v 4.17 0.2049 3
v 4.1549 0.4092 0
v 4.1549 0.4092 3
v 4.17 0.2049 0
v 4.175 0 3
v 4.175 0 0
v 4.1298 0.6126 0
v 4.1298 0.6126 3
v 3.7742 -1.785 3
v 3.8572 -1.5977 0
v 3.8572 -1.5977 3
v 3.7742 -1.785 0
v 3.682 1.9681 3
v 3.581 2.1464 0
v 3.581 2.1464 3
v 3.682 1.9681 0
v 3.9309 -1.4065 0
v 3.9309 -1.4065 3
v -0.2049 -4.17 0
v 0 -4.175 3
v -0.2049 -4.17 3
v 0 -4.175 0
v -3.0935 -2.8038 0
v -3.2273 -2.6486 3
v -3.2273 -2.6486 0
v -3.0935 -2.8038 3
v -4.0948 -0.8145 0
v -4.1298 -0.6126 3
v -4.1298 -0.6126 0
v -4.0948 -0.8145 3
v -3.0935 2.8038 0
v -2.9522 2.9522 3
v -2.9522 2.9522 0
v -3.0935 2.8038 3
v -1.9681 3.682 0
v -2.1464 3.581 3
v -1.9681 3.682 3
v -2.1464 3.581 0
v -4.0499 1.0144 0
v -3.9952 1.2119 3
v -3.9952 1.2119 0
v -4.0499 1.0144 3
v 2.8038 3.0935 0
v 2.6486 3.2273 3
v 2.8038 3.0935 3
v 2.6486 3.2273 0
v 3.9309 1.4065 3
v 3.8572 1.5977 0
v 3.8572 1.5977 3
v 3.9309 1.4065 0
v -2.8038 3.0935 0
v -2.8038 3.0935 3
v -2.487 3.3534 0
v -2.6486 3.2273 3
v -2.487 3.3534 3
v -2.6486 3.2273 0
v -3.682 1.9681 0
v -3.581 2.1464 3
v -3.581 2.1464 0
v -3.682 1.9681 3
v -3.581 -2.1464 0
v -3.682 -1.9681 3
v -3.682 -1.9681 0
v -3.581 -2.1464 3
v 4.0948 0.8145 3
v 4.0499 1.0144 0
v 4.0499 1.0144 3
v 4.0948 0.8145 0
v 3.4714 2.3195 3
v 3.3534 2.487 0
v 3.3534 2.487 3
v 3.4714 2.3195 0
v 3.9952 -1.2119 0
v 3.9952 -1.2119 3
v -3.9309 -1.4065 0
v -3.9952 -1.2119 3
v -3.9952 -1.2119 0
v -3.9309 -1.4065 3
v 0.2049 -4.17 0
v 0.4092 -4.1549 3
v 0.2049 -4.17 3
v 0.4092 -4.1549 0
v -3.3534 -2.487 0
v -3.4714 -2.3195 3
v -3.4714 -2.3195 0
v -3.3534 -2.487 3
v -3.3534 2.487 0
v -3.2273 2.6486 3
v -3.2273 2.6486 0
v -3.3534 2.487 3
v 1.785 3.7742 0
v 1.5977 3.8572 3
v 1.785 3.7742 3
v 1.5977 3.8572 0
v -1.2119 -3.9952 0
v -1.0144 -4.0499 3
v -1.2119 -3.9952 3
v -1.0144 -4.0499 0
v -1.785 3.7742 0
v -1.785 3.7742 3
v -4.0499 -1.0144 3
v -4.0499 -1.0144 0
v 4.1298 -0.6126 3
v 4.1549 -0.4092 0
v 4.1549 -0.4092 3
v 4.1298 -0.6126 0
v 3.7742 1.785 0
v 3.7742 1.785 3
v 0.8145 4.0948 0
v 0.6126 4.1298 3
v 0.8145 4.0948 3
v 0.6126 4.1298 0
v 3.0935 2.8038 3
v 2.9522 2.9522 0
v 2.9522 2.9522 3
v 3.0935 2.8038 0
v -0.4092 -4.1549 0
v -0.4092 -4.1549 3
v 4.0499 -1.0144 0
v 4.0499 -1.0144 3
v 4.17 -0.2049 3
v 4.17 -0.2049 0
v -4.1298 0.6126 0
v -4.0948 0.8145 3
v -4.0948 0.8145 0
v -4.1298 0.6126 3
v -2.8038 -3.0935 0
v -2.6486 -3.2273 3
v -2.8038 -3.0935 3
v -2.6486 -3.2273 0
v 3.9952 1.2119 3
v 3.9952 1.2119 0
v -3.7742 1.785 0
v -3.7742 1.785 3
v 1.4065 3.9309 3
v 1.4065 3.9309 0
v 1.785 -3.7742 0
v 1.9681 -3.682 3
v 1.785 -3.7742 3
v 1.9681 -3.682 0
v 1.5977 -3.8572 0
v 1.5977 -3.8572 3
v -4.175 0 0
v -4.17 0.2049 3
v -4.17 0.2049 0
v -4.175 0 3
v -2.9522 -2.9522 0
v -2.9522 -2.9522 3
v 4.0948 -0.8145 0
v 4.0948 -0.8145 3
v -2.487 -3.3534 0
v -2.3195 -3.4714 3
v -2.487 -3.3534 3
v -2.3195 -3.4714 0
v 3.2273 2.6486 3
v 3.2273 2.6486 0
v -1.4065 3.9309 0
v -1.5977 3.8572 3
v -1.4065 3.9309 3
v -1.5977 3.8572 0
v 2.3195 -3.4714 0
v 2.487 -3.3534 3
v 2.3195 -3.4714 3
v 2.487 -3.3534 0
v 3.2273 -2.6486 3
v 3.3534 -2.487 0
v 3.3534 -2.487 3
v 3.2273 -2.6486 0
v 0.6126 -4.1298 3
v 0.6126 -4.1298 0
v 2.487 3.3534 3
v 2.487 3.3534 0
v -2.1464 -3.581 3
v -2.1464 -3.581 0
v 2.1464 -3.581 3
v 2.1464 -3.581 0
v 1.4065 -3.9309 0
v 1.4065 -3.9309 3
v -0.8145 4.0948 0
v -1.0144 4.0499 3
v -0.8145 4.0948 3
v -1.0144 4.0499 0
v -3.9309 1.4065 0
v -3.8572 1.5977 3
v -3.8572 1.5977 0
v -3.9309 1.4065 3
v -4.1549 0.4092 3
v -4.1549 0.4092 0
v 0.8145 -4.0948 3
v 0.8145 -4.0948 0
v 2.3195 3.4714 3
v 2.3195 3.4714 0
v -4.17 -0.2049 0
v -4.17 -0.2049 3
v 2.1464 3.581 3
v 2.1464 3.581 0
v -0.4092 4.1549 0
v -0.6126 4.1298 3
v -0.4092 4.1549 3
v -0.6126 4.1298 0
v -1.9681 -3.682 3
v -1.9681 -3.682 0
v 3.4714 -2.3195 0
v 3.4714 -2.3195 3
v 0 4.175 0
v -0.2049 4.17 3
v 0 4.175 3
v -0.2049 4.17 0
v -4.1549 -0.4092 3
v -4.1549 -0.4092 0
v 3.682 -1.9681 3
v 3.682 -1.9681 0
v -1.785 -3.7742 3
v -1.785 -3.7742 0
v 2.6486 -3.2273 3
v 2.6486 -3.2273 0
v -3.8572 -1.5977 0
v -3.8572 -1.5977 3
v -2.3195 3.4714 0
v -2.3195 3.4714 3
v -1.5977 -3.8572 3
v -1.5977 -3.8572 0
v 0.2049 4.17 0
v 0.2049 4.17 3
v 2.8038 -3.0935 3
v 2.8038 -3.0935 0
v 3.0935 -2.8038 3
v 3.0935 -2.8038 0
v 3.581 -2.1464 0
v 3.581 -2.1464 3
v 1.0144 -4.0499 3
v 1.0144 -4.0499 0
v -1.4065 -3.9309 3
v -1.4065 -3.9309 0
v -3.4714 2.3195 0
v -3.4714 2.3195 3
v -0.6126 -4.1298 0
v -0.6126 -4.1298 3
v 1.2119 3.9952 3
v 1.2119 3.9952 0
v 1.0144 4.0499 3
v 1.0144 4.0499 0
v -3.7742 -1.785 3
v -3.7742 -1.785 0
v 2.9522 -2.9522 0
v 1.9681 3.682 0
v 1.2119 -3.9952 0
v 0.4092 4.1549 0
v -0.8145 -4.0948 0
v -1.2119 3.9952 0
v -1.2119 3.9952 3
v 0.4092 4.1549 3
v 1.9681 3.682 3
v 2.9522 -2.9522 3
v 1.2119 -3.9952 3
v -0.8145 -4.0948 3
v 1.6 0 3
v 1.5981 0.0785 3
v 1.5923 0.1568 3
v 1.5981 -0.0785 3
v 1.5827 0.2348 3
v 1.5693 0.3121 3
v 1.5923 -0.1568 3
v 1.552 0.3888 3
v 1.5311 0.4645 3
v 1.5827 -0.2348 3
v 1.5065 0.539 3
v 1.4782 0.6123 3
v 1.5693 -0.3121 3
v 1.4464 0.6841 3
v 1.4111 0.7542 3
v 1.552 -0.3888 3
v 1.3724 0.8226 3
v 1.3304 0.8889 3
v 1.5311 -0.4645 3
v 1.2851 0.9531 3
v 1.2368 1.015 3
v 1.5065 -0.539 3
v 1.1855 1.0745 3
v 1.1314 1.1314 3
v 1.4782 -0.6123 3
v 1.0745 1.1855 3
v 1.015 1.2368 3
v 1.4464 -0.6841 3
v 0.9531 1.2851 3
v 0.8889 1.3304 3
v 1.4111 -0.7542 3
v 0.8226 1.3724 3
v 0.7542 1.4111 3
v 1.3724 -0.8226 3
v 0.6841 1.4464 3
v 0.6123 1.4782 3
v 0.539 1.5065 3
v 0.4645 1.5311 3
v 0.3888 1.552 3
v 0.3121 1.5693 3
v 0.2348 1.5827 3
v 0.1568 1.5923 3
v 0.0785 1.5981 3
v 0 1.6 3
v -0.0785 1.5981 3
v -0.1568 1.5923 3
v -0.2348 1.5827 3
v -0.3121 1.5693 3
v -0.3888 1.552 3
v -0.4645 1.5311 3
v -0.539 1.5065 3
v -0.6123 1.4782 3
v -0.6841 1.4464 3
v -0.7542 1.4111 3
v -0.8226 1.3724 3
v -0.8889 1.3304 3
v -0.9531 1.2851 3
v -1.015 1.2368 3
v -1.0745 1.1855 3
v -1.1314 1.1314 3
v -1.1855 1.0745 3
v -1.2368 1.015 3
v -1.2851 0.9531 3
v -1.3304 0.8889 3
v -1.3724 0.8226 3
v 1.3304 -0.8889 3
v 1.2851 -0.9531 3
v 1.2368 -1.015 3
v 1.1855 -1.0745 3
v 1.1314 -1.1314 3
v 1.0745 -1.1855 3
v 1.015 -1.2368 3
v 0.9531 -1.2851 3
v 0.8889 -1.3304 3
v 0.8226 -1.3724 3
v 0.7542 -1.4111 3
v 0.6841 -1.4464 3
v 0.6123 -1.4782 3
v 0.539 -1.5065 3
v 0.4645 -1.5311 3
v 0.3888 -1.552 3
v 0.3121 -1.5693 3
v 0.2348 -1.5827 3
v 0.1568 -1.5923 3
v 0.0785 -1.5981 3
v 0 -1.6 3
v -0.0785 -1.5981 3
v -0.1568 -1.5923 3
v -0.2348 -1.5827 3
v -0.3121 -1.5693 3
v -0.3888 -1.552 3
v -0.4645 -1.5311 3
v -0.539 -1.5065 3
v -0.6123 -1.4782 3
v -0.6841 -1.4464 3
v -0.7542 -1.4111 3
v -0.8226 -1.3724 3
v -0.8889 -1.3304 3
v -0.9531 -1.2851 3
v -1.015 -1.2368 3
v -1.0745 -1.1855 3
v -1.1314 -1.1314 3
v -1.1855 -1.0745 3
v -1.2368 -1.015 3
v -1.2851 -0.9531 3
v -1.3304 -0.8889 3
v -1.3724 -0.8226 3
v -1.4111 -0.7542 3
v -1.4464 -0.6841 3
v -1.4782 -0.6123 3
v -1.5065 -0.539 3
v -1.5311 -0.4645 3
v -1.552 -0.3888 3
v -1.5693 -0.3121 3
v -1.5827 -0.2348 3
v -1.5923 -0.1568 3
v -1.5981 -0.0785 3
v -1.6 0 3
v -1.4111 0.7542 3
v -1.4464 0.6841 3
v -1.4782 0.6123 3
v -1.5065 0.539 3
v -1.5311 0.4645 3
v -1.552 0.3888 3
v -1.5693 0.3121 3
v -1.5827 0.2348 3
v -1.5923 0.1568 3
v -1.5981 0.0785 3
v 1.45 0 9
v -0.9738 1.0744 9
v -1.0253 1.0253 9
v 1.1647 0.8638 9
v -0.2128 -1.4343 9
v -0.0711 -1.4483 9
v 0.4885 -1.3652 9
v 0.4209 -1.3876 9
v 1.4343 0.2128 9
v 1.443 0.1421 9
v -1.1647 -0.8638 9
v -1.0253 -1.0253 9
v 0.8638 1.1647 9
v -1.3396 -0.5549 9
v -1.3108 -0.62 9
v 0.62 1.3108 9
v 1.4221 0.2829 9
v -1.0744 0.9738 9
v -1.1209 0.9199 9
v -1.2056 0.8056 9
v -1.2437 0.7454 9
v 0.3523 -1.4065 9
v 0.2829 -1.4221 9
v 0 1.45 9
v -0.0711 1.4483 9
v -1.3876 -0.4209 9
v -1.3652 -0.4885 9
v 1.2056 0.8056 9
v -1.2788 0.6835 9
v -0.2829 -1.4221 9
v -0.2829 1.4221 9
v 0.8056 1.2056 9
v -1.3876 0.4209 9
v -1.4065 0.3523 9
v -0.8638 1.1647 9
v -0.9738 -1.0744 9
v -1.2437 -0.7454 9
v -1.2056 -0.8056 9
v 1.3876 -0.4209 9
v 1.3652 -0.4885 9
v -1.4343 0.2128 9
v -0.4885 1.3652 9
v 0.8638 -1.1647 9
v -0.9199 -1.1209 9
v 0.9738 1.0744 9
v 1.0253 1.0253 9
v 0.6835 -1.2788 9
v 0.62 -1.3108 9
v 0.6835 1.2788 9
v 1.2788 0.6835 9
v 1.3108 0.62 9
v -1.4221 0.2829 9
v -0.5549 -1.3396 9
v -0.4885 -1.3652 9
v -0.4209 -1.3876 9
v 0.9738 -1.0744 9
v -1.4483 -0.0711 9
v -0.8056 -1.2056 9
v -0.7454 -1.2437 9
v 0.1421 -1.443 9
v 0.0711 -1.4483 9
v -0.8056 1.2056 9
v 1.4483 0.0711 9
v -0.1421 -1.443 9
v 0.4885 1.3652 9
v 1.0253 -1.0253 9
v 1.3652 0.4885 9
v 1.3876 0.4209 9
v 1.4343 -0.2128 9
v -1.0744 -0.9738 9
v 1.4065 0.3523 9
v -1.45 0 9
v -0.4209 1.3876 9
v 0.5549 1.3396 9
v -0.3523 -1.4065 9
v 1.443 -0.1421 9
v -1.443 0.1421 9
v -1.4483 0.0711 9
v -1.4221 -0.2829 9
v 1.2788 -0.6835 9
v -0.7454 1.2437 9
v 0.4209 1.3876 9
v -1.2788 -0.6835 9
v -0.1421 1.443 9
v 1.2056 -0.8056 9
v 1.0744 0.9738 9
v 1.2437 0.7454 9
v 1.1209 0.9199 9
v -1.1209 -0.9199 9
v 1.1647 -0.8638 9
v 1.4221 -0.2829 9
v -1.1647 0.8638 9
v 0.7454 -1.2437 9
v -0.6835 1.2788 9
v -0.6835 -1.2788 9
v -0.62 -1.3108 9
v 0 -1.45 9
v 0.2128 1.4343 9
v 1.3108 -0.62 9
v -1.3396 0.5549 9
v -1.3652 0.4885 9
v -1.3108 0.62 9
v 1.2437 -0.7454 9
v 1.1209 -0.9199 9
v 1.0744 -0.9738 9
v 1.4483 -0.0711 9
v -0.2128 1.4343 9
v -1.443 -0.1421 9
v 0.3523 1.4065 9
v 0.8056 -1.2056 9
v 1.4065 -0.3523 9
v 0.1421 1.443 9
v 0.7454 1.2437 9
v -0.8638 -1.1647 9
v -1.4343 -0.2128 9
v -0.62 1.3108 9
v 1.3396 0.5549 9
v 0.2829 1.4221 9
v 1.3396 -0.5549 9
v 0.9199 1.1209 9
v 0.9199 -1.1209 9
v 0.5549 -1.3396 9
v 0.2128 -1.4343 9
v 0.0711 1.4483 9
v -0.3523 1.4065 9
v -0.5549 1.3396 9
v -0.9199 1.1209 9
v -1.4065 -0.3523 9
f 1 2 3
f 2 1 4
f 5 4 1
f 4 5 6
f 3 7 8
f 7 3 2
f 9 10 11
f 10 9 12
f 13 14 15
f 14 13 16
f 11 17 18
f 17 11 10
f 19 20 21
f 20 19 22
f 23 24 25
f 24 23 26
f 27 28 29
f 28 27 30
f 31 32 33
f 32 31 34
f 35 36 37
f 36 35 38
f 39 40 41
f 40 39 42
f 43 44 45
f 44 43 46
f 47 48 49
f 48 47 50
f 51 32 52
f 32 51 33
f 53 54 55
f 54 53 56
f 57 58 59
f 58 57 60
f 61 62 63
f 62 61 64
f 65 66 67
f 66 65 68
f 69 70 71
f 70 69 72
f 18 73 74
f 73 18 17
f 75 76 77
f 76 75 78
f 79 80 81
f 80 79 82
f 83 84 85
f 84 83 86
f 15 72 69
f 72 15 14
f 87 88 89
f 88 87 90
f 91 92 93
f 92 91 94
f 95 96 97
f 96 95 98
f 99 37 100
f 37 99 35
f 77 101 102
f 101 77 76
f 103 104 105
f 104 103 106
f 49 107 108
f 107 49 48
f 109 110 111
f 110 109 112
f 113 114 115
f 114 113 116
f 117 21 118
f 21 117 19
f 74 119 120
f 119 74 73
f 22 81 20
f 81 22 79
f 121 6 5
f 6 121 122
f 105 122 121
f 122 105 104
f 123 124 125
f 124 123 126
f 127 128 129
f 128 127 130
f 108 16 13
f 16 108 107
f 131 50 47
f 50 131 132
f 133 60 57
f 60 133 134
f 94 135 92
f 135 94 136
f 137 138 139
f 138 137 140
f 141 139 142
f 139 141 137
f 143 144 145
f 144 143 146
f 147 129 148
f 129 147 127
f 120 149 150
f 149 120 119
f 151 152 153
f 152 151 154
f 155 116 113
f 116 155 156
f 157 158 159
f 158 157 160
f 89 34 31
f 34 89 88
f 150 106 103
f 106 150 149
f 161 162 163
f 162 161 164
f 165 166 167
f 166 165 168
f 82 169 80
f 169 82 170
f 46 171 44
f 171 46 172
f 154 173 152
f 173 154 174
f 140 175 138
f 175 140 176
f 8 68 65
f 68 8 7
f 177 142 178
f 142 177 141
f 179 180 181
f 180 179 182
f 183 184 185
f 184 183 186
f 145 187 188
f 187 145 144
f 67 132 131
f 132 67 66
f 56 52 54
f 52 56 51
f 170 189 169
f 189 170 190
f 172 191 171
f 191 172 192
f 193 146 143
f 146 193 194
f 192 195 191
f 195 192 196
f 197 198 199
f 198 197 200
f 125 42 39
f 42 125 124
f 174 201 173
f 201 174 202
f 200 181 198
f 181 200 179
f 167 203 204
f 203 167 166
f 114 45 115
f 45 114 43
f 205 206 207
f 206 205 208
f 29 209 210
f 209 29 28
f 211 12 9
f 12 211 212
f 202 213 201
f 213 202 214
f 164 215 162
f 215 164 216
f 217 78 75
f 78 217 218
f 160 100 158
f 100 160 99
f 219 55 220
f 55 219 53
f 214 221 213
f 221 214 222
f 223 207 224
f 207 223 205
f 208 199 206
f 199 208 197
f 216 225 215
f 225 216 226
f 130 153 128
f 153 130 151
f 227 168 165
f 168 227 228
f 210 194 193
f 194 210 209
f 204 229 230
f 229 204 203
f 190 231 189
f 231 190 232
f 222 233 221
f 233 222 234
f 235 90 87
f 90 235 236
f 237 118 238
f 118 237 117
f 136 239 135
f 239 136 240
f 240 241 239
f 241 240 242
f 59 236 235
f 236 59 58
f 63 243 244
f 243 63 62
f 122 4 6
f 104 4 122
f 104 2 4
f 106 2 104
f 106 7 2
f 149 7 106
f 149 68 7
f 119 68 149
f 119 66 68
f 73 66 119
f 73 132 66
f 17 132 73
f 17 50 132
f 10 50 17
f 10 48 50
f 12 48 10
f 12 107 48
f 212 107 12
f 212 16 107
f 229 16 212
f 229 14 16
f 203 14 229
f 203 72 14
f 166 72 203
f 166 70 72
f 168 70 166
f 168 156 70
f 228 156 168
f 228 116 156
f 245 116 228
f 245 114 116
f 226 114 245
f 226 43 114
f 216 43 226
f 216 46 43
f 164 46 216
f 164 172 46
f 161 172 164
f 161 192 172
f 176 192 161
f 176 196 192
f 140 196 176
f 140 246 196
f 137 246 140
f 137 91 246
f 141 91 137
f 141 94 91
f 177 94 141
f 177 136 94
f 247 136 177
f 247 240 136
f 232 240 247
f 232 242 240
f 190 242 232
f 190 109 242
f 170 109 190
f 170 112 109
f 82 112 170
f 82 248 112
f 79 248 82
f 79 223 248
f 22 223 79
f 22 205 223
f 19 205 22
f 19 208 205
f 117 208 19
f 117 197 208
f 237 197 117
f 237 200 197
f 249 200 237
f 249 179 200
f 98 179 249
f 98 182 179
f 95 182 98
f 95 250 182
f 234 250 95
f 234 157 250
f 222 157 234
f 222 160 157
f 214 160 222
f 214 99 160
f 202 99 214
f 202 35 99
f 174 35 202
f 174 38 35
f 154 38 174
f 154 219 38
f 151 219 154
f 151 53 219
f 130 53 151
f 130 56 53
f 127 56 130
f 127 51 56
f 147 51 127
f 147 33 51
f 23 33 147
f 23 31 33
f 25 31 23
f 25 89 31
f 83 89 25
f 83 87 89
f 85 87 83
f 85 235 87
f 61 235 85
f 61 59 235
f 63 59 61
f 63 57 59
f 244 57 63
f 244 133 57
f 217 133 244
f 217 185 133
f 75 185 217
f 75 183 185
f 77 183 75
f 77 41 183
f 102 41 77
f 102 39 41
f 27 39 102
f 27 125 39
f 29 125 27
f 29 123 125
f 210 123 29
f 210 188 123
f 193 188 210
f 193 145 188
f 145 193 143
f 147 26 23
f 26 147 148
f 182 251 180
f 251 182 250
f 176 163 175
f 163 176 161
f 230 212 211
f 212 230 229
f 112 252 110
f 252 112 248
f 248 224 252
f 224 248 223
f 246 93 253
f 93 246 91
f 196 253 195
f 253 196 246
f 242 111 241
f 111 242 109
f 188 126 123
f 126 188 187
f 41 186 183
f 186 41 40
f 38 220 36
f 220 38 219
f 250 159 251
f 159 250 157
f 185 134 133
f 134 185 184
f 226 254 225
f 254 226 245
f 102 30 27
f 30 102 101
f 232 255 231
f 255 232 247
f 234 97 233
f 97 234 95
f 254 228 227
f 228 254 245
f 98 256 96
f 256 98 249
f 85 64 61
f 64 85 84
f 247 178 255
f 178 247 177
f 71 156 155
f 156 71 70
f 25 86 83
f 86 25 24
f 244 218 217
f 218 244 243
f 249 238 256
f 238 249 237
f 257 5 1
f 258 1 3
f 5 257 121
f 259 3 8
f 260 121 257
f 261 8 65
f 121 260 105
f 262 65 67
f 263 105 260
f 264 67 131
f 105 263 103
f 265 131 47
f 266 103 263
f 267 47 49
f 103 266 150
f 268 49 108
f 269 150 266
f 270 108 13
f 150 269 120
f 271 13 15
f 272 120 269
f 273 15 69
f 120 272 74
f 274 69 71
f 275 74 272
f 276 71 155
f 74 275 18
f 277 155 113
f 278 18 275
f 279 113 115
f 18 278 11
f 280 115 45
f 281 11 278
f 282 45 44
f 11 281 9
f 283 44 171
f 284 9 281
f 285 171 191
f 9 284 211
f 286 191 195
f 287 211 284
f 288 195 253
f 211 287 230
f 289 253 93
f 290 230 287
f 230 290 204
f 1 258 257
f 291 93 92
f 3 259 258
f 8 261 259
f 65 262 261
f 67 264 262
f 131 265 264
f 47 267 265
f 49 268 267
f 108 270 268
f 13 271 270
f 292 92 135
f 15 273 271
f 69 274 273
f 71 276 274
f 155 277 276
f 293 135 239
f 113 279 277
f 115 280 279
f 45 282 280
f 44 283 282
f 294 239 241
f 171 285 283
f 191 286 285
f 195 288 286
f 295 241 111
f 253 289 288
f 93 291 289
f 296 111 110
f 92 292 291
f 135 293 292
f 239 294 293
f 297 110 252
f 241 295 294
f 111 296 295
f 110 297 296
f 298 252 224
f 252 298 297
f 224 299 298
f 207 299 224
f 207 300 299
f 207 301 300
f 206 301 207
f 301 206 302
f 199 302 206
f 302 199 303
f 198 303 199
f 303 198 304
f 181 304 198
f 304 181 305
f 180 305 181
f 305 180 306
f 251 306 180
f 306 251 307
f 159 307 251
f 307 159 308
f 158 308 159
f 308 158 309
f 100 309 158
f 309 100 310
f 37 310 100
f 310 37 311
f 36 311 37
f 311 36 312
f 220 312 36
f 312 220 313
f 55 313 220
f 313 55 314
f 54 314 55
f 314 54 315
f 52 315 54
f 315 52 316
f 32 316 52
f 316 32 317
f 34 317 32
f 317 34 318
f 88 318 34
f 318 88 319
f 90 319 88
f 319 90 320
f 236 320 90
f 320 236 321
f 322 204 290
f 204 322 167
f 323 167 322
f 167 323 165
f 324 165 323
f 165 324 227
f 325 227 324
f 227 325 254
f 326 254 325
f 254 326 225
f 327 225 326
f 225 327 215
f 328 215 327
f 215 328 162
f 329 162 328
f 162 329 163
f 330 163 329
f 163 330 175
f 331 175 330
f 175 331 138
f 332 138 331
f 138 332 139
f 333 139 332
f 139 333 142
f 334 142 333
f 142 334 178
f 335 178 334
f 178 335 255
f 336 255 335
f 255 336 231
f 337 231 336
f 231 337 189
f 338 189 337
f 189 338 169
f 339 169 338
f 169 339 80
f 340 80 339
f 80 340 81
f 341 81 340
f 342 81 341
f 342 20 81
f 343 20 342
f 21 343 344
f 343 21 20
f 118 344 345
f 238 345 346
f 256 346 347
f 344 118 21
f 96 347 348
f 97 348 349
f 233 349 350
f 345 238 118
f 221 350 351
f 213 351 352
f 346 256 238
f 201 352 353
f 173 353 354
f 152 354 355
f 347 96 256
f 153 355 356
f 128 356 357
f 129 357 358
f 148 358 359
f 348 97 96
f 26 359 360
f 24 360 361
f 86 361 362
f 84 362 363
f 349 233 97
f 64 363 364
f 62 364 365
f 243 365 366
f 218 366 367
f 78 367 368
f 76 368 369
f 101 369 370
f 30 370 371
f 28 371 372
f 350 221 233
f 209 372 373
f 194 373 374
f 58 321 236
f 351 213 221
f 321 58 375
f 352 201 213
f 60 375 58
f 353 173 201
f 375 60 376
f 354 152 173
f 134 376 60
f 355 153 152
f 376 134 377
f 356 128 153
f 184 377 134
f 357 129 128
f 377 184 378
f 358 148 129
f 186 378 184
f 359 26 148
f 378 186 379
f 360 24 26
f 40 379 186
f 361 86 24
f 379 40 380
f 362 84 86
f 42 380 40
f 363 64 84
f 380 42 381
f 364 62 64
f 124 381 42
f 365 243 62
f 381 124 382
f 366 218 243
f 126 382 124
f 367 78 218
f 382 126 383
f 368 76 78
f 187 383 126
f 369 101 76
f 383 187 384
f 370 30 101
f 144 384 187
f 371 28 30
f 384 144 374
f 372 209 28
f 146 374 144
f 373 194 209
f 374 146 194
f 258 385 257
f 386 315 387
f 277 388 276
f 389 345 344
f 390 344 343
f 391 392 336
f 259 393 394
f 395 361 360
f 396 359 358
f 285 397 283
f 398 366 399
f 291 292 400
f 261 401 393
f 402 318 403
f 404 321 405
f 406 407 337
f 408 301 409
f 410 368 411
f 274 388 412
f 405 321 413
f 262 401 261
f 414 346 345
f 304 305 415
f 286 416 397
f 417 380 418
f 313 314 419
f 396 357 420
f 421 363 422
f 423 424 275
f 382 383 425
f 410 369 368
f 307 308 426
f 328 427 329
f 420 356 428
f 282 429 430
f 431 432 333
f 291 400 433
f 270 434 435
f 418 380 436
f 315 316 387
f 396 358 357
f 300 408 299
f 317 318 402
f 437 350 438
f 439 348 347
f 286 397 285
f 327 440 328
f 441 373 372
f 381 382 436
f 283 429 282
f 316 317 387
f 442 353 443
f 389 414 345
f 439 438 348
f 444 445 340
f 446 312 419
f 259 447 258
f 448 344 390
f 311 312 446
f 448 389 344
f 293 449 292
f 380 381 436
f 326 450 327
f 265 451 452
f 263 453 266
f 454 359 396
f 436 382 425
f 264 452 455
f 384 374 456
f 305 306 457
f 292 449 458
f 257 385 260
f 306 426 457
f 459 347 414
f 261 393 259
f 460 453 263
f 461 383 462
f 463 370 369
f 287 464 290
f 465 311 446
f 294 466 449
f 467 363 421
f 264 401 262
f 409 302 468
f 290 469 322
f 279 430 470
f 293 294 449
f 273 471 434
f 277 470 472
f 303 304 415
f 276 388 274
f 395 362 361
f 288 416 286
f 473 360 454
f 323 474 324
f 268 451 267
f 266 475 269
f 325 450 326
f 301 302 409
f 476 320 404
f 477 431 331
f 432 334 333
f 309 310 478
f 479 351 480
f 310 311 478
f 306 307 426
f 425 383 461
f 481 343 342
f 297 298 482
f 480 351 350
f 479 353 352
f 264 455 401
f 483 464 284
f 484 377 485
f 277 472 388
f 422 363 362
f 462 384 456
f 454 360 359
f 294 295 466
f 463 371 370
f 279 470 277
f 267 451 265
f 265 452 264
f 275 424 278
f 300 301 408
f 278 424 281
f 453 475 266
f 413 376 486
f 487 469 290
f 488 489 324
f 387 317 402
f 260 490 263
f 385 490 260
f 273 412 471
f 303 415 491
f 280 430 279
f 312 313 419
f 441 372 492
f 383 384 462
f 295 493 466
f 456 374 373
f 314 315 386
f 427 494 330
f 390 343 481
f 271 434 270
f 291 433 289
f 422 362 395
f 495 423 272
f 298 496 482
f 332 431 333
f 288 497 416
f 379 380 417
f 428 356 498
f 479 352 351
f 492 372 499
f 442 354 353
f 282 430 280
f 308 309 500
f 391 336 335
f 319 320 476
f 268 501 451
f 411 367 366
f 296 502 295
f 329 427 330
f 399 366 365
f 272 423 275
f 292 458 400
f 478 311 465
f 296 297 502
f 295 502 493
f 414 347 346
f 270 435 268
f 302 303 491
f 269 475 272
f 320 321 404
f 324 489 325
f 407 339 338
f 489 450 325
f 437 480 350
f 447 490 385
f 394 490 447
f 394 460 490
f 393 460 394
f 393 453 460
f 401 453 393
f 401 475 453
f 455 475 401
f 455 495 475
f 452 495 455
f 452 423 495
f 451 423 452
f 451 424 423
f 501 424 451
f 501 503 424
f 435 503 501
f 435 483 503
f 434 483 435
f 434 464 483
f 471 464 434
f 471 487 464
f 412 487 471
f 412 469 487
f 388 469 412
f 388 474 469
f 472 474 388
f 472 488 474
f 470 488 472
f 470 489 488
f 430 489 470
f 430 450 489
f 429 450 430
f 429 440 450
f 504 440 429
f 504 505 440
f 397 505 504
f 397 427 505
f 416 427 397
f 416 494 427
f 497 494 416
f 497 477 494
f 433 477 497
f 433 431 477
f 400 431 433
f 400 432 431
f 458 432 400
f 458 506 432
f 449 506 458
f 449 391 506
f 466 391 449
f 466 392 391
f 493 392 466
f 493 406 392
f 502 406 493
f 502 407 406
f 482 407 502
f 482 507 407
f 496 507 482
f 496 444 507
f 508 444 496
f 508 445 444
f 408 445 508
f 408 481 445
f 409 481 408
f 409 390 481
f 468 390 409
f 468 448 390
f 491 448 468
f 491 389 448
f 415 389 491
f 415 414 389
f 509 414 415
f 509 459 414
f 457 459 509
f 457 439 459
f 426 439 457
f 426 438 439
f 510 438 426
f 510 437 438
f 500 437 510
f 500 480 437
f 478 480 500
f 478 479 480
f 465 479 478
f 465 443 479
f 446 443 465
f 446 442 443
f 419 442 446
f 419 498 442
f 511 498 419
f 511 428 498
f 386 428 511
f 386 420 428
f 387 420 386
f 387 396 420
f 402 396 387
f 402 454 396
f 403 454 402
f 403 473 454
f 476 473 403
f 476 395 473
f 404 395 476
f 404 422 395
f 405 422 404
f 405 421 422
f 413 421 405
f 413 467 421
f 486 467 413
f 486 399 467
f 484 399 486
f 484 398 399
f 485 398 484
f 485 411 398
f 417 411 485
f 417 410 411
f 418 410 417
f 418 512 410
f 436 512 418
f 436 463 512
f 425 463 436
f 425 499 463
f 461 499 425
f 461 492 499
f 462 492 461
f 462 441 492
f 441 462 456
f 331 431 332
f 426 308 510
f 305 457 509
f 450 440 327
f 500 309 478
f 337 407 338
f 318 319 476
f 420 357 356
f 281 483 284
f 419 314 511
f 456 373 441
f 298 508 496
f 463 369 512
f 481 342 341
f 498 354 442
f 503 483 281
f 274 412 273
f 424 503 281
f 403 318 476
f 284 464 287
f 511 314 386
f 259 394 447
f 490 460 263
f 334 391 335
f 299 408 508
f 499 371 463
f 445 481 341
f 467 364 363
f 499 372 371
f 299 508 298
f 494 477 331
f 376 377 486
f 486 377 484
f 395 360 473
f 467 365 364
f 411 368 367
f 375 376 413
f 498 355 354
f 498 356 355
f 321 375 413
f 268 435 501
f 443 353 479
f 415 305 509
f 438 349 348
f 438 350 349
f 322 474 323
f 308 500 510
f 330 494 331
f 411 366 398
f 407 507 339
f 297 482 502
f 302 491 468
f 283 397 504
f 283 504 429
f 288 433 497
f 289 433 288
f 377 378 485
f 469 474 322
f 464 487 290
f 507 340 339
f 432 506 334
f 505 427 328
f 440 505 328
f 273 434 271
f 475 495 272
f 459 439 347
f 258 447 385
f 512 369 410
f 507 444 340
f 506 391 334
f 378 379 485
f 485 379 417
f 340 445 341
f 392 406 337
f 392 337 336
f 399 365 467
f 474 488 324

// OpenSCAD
screw();

module screw(
    center_screwed_position = false,
    diameter_ajustment_head = 0.2,
    diameter_ajustment_screw = -0.1,
    _fn = 128
) {

    head_height = 2.1;
    middle_height = 0.9;
    bottom_height = 6;

    z_centring_translation = center_screwed_position ? -head_height -middle_height : 0;

    translate([0,0, z_centring_translation])
        union() {
            cylinder(
                r = 7.95 / 2 + diameter_ajustment_head,
                h = head_height + middle_height,
                $fn = _fn);
            translate([0, 0, head_height + middle_height])
                cylinder(
                    r1 = 3.4 / 2 + diameter_ajustment_screw,
                    r2 = 3.1 / 2 + diameter_ajustment_screw,
                    h = bottom_height,
                    $fn = _fn
                );
        }
}
